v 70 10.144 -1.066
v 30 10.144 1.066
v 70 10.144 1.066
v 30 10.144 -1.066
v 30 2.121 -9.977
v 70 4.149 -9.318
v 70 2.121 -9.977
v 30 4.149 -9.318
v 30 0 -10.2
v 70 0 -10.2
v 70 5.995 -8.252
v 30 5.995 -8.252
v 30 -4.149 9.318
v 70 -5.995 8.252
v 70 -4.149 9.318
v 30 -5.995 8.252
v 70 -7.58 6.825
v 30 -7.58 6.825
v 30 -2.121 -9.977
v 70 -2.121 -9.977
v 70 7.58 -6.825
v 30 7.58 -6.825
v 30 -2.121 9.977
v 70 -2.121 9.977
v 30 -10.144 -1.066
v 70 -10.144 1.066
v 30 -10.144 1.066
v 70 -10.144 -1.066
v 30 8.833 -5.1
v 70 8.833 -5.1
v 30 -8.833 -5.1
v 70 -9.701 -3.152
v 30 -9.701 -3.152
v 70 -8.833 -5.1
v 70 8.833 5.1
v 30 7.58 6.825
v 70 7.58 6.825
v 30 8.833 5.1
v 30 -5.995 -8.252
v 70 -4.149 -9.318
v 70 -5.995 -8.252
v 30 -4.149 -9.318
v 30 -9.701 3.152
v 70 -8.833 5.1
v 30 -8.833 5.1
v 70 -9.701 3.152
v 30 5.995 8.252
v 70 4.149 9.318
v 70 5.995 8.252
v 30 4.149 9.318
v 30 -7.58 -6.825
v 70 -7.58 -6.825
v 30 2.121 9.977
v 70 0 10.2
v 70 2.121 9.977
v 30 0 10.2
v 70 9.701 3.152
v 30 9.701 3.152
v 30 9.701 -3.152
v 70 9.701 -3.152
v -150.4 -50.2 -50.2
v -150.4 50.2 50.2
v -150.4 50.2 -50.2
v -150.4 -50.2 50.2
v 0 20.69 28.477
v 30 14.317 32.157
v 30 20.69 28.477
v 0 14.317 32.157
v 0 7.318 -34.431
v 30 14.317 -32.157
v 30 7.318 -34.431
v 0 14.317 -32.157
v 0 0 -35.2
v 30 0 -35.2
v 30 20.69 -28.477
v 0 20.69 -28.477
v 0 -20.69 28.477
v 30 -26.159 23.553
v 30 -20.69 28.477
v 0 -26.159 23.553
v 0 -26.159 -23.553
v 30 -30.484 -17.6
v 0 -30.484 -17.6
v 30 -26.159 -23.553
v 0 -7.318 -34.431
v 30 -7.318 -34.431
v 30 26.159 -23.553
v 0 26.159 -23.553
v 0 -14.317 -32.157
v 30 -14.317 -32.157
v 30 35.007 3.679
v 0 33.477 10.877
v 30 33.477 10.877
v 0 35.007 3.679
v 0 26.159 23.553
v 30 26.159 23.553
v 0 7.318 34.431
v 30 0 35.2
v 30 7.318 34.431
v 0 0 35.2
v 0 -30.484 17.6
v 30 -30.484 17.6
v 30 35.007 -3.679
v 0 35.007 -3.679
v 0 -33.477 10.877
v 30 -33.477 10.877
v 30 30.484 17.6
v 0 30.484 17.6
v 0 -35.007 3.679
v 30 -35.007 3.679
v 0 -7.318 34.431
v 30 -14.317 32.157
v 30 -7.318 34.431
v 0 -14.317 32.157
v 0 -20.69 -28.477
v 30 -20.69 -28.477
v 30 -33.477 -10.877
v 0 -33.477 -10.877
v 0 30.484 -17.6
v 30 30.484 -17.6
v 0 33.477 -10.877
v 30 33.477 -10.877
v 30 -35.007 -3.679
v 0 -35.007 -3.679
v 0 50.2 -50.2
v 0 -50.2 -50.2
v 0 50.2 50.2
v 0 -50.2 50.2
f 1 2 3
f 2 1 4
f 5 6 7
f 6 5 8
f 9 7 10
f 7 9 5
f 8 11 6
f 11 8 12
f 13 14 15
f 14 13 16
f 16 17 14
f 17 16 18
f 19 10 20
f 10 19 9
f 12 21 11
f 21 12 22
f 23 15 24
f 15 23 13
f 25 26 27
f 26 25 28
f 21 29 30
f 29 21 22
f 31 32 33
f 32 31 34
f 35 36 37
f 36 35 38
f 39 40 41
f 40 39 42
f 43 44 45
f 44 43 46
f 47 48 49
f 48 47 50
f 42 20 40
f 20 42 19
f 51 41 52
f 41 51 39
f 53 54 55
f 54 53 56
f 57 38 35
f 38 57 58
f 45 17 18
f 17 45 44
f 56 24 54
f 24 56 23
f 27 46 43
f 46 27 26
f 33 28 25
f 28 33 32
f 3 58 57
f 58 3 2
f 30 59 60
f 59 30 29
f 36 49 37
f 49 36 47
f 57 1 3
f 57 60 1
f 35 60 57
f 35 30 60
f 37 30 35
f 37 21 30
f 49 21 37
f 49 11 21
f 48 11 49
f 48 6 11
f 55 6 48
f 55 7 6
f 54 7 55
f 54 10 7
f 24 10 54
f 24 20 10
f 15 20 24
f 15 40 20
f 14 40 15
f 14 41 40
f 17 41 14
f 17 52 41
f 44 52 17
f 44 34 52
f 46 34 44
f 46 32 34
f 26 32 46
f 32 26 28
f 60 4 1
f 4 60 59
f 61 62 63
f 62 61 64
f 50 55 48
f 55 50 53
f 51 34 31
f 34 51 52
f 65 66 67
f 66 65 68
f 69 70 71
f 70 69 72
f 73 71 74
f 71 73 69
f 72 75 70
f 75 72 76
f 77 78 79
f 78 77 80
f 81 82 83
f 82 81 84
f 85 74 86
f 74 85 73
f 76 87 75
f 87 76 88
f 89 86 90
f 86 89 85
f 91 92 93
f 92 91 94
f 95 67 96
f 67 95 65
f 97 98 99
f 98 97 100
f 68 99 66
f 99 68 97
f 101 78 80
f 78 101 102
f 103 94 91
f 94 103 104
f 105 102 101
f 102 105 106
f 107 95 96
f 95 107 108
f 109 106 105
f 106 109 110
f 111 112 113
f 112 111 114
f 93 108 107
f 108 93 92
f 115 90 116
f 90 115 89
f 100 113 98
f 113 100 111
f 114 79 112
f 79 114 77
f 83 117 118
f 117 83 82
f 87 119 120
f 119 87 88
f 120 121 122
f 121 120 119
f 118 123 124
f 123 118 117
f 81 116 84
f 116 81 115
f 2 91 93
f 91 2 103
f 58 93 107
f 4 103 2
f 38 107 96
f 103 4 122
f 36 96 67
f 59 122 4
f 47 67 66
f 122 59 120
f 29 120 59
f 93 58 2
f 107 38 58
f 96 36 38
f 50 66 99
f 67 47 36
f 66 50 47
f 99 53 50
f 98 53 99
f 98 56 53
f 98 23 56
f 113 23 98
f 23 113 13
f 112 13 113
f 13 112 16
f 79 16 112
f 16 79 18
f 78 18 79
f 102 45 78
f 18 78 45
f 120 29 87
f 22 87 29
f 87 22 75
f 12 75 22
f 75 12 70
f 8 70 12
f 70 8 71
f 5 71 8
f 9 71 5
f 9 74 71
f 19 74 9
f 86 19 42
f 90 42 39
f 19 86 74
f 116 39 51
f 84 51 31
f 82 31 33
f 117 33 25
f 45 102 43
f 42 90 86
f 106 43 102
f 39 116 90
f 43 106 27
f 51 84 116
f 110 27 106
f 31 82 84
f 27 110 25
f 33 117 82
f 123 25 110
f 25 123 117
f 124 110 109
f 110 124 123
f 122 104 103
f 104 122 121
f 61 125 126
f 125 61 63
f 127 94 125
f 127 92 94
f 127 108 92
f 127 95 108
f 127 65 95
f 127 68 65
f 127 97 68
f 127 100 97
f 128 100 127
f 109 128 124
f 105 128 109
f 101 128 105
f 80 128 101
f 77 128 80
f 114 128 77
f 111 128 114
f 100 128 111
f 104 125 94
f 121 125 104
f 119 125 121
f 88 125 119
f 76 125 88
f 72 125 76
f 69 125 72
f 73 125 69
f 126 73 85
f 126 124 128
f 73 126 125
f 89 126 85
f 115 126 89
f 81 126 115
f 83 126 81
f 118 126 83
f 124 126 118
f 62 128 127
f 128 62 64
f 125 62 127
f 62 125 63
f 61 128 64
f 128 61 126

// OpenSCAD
// file: Zrod.scad
use <../Parameters.scad>

function ZrodLength()=1000;
function ZrodDiameter()=8 + 3dPrinterTolerance()*3;  //base case: 8
function ZrodRadius()=ZrodDiameter()/2;

module Zrod()
{
color("Silver")
cylinder(ZrodLength(), ZrodRadius(), ZrodRadius());
}

Zrod();
// file: ../Parameters.scad
use<Vitamins/Zrod.scad>
//use<Vitamins/LinearBearing.scad>

//tolerances
function LaserCutTolerance() = .02;
function 3dPrinterTolerance() = .4;


function LinearBearingDiam() = 15 + 3dPrinterTolerance();
function mm(i) = i*25.4; 

//Build dimensions (x,y,z)-- x, y and z of printable area, NOT of overall device

//z-rod length, diameter-- dependent on which rods you buy
//(bearing diameter is dependent on rod diameter)


function ZBearingSpacing()= 105;
function ZrodSpacing()=ZBearingSpacing()-LinearBearingDiam()*2-PlasticWidth()*4;
echo(ZrodSpacing());

//parametric of which hotend is being used (printerbot or bucha nozzle)

//stepper vs servo

//3 parameters (1 for each link) horizontal vs vertical

//paper is a parametric vitamin

//distance between link arms will be calculable based on radius of toolplate








//the equation used for plastic width, it can of course be changed
function PlasticWidth()= (ZrodDiameter()/2);
function SideWidth() = (ZrodDiameter()+PlasticWidth());
// main file
use <../Parameters.scad>

function BoxWidth()=100 + 3dPrinterTolerance();
function BoxHeight()=150 + 3dPrinterTolerance();
function HubDiameter()=70 + 3dPrinterTolerance();
function HubHeight()=180 + 3dPrinterTolerance();
function ShaftDiameter()=20 + 3dPrinterTolerance();
function ShaftHeight()=220 + 3dPrinterTolerance();

module ZAxisMotor()
{
color("Gray")
rotate([0,90,0])
{
	translate([0,0,-BoxHeight()])
		{
		union()
			{
			cylinder(ShaftHeight(), ShaftDiameter()/2, ShaftDiameter()/2);
			cylinder(HubHeight(), HubDiameter()/2, HubDiameter()/2);
			translate([-BoxWidth()/2,-BoxWidth()/2,0])
				{
				cube([BoxWidth(), BoxWidth(), BoxHeight()]);
				}
			}
		}
	}
}

ZAxisMotor();
